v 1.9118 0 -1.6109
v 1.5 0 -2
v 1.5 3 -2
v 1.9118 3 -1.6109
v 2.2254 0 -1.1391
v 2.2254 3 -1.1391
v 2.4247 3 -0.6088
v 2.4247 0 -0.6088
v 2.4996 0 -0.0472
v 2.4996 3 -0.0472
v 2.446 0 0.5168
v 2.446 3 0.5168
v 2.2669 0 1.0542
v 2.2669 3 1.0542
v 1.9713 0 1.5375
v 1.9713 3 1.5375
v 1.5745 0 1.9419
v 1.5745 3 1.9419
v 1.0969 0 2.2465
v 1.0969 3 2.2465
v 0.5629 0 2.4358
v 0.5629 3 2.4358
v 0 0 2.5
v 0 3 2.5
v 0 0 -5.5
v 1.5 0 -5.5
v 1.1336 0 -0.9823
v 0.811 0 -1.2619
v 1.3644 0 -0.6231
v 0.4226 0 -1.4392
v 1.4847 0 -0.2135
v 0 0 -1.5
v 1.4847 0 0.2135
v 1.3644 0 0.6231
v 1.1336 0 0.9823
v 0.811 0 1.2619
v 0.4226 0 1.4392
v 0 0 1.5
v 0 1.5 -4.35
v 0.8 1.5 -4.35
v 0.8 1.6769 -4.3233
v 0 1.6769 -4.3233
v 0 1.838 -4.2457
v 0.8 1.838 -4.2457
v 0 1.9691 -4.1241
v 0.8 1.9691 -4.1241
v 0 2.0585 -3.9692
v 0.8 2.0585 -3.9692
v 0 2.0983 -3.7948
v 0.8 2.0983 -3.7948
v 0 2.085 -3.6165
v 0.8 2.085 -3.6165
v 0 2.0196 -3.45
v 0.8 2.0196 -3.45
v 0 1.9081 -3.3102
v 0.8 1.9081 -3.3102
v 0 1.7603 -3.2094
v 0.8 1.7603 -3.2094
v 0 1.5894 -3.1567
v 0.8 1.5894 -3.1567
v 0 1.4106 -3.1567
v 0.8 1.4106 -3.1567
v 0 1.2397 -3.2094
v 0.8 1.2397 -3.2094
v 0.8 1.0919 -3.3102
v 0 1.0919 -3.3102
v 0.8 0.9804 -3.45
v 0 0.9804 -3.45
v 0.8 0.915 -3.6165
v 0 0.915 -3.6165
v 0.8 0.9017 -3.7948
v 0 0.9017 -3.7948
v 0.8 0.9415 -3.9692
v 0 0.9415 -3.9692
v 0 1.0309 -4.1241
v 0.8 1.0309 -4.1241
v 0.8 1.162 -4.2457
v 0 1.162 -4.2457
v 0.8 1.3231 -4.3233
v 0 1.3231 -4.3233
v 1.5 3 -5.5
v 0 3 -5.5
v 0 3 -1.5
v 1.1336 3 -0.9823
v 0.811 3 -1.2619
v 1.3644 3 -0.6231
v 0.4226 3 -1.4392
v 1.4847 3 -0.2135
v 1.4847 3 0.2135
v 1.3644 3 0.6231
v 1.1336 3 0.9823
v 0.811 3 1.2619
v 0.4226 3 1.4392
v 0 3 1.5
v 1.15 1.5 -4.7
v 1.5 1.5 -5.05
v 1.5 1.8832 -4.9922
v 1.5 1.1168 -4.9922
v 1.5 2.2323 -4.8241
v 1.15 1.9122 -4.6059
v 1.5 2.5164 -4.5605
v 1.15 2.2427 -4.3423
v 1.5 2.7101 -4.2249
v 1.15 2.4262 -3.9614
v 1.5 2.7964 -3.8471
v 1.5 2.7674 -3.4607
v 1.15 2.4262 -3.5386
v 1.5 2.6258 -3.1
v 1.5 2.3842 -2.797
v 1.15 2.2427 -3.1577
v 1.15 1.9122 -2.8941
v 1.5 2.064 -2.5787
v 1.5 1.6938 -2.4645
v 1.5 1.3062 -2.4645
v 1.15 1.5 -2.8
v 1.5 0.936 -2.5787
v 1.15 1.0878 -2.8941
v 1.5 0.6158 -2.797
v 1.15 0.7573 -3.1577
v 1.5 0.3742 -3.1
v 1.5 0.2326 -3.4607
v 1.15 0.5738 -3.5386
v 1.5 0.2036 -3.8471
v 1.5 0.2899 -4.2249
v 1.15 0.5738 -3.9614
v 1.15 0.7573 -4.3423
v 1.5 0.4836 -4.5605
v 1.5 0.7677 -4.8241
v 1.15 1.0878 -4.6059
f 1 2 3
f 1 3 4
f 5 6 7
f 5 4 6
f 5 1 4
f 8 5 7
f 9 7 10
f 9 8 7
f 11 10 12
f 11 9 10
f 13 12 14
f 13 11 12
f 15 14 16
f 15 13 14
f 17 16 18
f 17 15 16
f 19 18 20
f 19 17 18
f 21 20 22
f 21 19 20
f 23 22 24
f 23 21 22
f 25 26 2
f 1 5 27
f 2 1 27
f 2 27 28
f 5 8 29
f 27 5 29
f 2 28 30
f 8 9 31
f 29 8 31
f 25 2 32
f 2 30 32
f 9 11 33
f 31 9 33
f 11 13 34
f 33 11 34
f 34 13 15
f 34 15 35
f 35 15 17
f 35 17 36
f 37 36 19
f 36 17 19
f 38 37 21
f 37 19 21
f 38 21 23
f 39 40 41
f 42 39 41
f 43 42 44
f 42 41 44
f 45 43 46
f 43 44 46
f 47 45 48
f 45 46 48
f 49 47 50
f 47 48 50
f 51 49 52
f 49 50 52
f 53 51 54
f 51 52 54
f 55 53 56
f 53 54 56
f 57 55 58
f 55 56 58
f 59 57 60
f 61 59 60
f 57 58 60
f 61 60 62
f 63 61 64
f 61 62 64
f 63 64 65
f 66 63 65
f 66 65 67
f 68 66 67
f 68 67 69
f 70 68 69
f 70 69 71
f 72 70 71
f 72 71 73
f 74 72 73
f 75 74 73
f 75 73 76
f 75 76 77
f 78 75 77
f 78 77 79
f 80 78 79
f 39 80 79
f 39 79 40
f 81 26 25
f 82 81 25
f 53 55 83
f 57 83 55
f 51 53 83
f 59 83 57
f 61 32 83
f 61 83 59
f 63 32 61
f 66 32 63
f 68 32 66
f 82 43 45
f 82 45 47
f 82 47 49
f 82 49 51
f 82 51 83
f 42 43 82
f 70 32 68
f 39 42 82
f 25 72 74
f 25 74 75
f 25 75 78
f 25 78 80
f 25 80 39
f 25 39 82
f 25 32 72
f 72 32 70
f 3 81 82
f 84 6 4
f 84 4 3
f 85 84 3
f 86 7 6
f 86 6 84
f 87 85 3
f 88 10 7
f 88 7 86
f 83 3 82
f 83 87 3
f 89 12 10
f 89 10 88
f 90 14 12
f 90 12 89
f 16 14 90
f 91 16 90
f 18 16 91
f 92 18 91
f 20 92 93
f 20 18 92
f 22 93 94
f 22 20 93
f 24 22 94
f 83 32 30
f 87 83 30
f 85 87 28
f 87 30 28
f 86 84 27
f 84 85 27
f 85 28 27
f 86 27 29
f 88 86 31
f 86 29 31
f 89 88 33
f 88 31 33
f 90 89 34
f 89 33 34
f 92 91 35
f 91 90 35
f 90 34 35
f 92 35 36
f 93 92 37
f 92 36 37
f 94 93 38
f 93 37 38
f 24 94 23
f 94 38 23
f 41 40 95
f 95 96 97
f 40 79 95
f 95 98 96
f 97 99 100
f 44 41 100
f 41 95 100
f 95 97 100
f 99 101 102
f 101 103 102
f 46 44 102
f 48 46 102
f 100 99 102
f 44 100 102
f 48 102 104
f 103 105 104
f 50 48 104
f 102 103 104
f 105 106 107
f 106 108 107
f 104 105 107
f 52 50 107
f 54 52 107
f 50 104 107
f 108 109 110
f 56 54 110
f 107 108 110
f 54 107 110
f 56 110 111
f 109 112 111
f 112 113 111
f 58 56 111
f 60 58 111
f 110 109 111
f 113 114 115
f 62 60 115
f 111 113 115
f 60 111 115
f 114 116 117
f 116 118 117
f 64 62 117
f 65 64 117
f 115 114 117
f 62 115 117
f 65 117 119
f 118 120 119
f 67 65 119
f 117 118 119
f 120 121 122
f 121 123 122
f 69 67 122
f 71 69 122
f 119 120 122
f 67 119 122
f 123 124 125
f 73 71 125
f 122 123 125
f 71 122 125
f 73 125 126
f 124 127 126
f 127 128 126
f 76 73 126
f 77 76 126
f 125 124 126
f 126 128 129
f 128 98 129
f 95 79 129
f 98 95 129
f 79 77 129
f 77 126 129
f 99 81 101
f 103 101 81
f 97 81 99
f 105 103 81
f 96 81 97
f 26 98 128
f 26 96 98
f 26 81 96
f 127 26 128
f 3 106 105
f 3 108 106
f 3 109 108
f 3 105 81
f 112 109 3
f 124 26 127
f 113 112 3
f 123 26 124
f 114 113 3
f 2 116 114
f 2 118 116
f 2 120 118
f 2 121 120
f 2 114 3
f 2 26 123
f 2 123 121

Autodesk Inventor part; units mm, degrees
ref_plane "YZ Plane" through (0, 0, 0) normal (1, 0, 0) x (0, 1, 0)
ref_plane "XZ Plane" through (0, 0, 0) normal (0, 1, 0) x (-1, 0, 0)
ref_plane "XY Plane" through (0, 0, 0) normal (0, 0, 1) x (1, 0, 0)
sketch "Sketch1" plane through (0, 0, 0) normal (0, 1, 0) x (-1, 0, 0)
  arc A0 (0, 1.5) -> (0, -1.5) centre (0, 0) ccw
  line L0 (0, 1.5) -> (0, 2.5)
  arc A1 (0, 2.5) -> (0, -2.5) centre (0, 0) ccw
  line L1 (0, -1.5) -> (0, -2.5)
  line L2 (0, -2.5) -> (-1.5, -2.5)
  line L3 (-1.5, -2.5) -> (-1.5, -5.5)
  line L4 (-1.5, -5.5) -> (0, -5.5)
  line L5 (0, -5.5) -> (0, -2.5)
  line L6 (-1.5, -2.5) -> (-1.5, -2)
  dimension "d0" = 1.5
  dimension "d1" = 1
  dimension "d2" = 1.5
  dimension "d3" = 3
extrude "Extrusion1" add sketch "Sketch1" along normal blind 3
sketch "Sketch2" plane through (1.5, 0, -2) normal (1, 0, 0) x (0, 0, -1)
  line L0 (0, 3) -> (3.5, 3) projected
  line L1 (1.75, 3) -> (1.75, 0) construction
  line L2 (3.5, 0) -> (3.5, 3) projected
  line L3 (3.5, 1.5) -> (1.75, 1.5) construction
  circle A0 centre (1.75, 1.5) radius 0.6
  point P0 (-2, 0)
  dimension "d6" = 1.2
extrude "Extrusion2" cut sketch "Sketch2" against normal blind 3
chamfer "Chamfer1" distance 0.7 angle 45 1 edges at (1.5, 1.5, -3.15)
properties part number "miniWiresHolder"
